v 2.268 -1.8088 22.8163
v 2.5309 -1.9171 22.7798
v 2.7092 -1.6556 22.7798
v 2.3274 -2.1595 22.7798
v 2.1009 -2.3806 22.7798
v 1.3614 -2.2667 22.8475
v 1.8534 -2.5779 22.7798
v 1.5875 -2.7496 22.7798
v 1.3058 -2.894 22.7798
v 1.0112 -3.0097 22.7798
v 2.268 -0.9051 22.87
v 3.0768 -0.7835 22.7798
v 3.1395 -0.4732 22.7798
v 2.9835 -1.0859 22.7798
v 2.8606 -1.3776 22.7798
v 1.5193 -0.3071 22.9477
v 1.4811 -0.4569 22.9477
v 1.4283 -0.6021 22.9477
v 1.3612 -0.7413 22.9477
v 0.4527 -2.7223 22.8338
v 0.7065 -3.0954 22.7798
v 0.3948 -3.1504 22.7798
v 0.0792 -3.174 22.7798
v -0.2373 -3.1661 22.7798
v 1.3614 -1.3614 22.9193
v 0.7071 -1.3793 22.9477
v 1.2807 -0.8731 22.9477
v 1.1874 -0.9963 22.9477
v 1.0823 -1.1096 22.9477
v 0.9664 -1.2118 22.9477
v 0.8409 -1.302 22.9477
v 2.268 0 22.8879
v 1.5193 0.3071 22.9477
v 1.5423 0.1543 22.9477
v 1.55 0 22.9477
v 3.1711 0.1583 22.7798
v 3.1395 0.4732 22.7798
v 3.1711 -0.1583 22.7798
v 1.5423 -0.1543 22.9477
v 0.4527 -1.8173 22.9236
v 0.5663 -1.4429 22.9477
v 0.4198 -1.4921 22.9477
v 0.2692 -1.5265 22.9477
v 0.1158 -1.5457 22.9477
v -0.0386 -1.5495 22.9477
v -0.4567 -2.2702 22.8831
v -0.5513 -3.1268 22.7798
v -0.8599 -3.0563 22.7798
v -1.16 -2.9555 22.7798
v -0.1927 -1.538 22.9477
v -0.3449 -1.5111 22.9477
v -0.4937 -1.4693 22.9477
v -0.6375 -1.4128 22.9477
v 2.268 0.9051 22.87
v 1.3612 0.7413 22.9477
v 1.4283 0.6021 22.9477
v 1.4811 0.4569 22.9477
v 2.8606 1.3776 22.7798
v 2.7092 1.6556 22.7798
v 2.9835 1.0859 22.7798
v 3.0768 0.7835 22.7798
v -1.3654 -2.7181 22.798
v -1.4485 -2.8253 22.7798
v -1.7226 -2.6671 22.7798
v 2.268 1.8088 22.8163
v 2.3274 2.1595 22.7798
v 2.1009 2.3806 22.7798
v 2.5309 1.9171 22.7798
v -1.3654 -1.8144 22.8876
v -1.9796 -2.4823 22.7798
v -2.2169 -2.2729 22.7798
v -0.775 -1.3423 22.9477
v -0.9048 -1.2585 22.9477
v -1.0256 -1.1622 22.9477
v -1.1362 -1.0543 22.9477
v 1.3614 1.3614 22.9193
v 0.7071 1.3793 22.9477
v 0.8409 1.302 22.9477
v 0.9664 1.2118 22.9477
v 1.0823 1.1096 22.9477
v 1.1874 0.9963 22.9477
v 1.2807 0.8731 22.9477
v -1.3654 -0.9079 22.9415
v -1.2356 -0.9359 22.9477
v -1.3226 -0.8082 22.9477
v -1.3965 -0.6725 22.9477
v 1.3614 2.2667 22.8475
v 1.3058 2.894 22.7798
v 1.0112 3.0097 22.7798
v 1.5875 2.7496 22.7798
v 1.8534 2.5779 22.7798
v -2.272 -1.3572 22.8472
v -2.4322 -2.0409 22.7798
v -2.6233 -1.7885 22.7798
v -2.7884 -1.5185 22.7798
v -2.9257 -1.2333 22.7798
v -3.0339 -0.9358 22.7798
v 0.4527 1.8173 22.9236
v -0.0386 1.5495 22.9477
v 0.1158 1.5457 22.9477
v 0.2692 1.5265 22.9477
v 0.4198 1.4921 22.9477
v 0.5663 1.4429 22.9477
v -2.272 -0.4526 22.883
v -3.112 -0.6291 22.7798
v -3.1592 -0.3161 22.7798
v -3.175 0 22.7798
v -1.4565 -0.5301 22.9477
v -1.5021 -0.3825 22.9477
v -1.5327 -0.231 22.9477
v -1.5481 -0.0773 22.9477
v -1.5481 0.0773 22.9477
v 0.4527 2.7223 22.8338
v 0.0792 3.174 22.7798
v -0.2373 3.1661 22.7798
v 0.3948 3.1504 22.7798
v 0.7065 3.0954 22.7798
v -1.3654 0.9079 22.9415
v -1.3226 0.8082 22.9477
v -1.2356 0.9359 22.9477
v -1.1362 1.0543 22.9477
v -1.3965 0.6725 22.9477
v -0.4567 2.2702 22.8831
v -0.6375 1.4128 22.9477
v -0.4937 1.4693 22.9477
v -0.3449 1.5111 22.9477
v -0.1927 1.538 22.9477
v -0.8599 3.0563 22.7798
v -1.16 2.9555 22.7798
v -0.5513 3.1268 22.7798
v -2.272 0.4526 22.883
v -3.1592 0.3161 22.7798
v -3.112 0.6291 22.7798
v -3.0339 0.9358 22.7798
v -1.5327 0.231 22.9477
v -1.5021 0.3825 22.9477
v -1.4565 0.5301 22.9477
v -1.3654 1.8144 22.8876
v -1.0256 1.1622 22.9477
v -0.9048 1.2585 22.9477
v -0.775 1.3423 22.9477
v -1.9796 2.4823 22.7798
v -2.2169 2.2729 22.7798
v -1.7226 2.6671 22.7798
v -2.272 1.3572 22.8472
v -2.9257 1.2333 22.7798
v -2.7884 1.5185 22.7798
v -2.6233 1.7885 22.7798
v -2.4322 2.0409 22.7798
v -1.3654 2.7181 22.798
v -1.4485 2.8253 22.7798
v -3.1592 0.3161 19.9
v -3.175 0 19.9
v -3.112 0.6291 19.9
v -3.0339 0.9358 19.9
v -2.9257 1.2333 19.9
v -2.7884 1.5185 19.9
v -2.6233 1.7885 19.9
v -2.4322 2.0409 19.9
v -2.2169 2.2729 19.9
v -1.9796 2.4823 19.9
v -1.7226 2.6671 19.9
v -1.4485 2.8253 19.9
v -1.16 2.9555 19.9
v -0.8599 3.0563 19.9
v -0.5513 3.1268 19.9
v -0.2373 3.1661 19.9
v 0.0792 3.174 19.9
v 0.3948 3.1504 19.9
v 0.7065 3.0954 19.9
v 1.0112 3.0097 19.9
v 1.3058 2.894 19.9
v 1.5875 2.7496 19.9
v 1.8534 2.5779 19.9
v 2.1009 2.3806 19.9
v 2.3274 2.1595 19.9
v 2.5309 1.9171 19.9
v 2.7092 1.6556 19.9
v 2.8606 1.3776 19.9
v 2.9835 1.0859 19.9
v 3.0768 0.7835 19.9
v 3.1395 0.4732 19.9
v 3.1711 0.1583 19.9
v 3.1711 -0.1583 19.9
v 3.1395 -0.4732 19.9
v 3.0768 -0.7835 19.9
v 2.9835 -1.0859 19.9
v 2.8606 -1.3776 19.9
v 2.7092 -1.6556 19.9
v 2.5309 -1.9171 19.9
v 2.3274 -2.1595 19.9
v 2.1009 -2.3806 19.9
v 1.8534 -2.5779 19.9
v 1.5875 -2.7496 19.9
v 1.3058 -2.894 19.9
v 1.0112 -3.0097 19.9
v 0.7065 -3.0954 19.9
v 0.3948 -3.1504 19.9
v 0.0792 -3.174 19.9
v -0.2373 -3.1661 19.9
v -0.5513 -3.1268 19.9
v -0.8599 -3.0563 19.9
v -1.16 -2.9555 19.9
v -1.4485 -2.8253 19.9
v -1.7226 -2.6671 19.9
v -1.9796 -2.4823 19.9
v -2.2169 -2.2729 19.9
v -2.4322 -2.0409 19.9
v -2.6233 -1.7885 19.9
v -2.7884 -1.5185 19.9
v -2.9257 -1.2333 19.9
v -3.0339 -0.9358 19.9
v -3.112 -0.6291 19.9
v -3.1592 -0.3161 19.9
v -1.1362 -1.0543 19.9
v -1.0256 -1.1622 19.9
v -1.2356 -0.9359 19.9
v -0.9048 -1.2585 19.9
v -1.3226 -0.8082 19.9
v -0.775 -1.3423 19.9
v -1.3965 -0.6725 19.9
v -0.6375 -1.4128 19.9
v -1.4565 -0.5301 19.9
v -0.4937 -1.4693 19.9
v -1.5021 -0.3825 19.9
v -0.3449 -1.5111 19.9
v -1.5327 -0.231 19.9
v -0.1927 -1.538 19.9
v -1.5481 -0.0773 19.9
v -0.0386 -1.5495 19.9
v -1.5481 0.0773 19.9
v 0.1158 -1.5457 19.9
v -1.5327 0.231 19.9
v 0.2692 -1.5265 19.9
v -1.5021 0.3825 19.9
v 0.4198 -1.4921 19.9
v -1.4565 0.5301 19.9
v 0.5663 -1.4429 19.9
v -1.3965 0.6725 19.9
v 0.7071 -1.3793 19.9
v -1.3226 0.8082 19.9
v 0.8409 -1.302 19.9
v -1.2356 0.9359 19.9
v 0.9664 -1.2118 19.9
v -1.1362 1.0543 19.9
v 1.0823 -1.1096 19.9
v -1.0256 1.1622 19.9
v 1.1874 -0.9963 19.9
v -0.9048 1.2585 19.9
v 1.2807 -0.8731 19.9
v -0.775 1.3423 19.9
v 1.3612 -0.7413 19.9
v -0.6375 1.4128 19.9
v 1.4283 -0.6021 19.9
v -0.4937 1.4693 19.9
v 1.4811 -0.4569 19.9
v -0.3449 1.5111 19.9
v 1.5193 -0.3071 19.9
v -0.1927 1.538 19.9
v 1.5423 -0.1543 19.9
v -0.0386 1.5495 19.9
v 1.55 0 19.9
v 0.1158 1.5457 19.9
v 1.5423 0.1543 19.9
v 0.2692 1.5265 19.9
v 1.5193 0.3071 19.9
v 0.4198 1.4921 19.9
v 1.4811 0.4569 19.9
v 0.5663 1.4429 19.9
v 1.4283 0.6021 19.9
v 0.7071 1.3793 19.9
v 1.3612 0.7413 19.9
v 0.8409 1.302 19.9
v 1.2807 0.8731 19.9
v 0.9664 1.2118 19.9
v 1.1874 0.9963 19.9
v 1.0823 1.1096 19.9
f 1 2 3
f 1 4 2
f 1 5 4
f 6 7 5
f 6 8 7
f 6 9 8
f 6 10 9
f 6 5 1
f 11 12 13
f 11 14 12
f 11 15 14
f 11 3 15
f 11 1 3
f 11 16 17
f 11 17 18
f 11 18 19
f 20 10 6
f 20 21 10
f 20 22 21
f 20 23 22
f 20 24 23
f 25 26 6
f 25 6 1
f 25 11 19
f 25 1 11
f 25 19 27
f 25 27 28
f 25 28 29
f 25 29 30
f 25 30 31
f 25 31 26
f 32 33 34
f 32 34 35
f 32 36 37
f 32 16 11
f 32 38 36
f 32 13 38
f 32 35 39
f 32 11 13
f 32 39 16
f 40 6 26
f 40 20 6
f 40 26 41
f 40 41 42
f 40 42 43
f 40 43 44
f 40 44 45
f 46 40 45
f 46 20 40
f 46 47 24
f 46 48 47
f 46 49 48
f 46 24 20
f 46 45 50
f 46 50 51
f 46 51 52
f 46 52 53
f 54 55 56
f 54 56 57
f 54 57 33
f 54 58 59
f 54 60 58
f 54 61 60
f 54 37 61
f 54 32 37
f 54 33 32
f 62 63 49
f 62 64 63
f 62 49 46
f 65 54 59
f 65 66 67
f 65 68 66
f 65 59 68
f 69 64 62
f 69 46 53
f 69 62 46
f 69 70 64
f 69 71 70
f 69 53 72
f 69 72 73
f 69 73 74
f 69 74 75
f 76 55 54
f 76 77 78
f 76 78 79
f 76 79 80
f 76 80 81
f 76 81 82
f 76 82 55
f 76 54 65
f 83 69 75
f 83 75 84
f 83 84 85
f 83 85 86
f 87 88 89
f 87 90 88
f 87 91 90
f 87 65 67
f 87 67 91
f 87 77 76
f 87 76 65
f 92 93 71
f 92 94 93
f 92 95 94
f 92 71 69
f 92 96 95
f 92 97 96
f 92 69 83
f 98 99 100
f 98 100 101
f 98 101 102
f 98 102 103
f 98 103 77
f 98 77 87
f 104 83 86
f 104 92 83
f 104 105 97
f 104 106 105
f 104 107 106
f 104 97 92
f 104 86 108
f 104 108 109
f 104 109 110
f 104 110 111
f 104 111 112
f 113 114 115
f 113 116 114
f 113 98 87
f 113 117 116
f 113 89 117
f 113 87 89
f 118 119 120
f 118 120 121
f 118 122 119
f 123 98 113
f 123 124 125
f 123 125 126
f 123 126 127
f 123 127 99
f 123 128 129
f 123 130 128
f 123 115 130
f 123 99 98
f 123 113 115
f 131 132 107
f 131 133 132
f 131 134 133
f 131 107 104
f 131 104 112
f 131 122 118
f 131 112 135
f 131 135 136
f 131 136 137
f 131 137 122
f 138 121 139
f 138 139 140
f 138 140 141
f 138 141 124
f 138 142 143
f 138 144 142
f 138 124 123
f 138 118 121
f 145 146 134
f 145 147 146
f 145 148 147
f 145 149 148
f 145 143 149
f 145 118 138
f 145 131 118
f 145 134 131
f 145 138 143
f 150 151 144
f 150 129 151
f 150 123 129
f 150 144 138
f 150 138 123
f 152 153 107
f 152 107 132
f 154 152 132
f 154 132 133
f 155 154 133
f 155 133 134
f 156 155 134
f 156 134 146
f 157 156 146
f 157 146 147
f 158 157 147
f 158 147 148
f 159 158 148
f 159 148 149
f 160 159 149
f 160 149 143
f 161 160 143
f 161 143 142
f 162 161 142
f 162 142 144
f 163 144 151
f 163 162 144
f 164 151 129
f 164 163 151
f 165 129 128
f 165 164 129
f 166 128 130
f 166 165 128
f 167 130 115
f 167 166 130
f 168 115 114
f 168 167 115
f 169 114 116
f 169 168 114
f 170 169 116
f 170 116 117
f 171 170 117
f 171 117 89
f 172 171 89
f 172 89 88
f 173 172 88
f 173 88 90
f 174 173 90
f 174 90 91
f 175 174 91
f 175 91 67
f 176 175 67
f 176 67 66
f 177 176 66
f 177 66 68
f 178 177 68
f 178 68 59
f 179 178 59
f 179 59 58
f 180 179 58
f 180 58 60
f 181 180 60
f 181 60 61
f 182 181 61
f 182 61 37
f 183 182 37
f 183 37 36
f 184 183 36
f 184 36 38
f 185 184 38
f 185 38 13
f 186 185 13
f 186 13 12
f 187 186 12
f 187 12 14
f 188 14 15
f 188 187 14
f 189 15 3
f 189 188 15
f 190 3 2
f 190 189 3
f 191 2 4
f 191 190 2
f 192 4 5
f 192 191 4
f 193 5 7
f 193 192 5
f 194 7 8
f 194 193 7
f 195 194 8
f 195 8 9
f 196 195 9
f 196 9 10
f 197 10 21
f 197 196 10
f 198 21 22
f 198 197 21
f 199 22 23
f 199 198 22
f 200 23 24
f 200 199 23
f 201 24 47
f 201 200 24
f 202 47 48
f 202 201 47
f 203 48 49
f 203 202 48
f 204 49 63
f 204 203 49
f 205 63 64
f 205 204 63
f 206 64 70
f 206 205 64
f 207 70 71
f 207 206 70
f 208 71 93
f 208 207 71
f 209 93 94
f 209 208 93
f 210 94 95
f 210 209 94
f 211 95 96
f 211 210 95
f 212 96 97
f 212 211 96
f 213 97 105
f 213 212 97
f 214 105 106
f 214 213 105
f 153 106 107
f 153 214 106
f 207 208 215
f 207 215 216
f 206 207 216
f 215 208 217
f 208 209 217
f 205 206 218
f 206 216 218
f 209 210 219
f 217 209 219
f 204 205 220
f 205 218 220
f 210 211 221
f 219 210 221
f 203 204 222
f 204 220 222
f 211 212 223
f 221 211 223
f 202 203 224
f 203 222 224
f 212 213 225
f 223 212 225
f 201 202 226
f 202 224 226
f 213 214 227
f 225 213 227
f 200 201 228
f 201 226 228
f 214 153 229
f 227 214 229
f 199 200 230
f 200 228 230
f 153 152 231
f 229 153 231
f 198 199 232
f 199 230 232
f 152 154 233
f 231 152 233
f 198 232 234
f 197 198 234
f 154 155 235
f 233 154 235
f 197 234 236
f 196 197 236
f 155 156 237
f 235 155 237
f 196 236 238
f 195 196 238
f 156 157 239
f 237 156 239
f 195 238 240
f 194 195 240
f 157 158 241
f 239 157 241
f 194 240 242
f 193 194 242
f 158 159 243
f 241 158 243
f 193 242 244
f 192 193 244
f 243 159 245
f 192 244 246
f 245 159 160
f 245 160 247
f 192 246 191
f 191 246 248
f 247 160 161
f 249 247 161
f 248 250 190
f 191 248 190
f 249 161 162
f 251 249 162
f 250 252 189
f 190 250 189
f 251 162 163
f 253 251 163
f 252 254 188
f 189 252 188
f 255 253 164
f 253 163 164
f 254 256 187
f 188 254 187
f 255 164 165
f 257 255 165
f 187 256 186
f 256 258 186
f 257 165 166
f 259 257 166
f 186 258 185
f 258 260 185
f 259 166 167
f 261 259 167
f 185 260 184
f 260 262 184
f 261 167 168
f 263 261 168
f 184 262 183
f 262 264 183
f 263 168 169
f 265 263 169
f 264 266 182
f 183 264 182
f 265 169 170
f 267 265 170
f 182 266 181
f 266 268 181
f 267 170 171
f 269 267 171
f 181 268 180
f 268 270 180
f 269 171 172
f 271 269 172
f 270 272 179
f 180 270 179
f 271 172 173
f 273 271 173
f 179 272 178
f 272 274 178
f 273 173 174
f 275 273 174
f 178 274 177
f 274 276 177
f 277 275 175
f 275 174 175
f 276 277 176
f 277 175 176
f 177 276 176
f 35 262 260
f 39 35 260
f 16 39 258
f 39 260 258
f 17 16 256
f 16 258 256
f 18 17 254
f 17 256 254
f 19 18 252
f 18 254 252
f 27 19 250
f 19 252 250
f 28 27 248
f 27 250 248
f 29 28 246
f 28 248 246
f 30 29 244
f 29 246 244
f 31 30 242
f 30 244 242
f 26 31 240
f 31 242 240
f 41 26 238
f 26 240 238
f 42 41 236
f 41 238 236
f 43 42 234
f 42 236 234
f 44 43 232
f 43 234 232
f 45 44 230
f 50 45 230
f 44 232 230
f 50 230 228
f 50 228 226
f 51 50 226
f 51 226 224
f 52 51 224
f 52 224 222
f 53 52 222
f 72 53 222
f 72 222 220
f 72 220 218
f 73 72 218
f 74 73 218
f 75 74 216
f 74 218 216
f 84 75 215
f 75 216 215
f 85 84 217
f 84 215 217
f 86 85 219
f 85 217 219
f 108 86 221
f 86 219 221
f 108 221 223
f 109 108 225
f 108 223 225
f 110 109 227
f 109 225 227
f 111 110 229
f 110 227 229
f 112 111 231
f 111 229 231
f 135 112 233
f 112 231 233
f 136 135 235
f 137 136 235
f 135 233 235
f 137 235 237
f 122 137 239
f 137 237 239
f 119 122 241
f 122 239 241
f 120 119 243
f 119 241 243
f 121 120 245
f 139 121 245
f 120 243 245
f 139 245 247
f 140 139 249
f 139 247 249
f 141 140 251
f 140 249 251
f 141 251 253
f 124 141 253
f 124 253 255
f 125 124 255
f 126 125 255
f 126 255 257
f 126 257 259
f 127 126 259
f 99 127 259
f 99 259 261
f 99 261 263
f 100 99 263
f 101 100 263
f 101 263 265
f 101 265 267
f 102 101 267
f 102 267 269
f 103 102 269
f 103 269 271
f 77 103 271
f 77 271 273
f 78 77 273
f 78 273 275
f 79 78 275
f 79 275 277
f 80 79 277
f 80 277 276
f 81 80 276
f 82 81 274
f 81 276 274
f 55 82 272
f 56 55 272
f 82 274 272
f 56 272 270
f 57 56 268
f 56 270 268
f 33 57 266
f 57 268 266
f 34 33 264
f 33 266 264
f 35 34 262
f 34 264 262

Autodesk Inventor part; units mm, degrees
ref_plane "YZ Plane" through (0, 0, 0) normal (1, 0, 0) x (0, 1, 0)
ref_plane "XZ Plane" through (0, 0, 0) normal (0, 1, 0) x (-1, 0, 0)
sketch "Sketch1" plane through (0, 0, 0) normal (0, 0, 1) x (1, 0, 0)
  line L0 (-34.9979, 0) -> (51.0758, 0)
  arc A0 (23, 0) -> (-23, 0) centre (0, 0) ccw
  dimension "d0" = 46
revolve "Revolution1" add sketch "Sketch1" angle 360 about axis through (-34.9979, 0, 0) along (1, 0, 0)
ref_plane "Work Plane1" through (0, 0, 19.9) normal (0, 0, 1) x (1, 0, 0)
sketch "Sketch2" plane through (0, 0, 19.9) normal (0, 0, 1) x (1, 0, 0)
  circle A0 centre (0, 0) radius 11.5321 projected
extrude "Extrusion1" cut sketch "Sketch2" against normal through all
sketch "Sketch3" plane through (0, 0, 19.9) normal (0, 0, 1) x (1, 0, 0)
  circle A0 centre (0, 0) radius 27.1797
extrude "Extrusion2" cut sketch "Sketch3" against normal through all
sketch "Sketch4" plane through (0, 0, 19.9) normal (0, 0, 1) x (1, 0, 0)
  circle A0 centre (0, 0) radius 1.55
  dimension "d9" = 3.1
extrude "Extrusion3" cut sketch "Sketch4" along normal through all
sketch "Sketch5" plane through (0, 0, 19.9) normal (0, 0, -1) x (-1, 0, 0)
  circle A0 centre (0, 0) radius 11.5321 projected
  circle A1 centre (0, 0) radius 3.175
  dimension "d13" = 6.35
extrude "Extrusion4" cut sketch "Sketch5" against normal through all
properties part number "PVC Spacer"
